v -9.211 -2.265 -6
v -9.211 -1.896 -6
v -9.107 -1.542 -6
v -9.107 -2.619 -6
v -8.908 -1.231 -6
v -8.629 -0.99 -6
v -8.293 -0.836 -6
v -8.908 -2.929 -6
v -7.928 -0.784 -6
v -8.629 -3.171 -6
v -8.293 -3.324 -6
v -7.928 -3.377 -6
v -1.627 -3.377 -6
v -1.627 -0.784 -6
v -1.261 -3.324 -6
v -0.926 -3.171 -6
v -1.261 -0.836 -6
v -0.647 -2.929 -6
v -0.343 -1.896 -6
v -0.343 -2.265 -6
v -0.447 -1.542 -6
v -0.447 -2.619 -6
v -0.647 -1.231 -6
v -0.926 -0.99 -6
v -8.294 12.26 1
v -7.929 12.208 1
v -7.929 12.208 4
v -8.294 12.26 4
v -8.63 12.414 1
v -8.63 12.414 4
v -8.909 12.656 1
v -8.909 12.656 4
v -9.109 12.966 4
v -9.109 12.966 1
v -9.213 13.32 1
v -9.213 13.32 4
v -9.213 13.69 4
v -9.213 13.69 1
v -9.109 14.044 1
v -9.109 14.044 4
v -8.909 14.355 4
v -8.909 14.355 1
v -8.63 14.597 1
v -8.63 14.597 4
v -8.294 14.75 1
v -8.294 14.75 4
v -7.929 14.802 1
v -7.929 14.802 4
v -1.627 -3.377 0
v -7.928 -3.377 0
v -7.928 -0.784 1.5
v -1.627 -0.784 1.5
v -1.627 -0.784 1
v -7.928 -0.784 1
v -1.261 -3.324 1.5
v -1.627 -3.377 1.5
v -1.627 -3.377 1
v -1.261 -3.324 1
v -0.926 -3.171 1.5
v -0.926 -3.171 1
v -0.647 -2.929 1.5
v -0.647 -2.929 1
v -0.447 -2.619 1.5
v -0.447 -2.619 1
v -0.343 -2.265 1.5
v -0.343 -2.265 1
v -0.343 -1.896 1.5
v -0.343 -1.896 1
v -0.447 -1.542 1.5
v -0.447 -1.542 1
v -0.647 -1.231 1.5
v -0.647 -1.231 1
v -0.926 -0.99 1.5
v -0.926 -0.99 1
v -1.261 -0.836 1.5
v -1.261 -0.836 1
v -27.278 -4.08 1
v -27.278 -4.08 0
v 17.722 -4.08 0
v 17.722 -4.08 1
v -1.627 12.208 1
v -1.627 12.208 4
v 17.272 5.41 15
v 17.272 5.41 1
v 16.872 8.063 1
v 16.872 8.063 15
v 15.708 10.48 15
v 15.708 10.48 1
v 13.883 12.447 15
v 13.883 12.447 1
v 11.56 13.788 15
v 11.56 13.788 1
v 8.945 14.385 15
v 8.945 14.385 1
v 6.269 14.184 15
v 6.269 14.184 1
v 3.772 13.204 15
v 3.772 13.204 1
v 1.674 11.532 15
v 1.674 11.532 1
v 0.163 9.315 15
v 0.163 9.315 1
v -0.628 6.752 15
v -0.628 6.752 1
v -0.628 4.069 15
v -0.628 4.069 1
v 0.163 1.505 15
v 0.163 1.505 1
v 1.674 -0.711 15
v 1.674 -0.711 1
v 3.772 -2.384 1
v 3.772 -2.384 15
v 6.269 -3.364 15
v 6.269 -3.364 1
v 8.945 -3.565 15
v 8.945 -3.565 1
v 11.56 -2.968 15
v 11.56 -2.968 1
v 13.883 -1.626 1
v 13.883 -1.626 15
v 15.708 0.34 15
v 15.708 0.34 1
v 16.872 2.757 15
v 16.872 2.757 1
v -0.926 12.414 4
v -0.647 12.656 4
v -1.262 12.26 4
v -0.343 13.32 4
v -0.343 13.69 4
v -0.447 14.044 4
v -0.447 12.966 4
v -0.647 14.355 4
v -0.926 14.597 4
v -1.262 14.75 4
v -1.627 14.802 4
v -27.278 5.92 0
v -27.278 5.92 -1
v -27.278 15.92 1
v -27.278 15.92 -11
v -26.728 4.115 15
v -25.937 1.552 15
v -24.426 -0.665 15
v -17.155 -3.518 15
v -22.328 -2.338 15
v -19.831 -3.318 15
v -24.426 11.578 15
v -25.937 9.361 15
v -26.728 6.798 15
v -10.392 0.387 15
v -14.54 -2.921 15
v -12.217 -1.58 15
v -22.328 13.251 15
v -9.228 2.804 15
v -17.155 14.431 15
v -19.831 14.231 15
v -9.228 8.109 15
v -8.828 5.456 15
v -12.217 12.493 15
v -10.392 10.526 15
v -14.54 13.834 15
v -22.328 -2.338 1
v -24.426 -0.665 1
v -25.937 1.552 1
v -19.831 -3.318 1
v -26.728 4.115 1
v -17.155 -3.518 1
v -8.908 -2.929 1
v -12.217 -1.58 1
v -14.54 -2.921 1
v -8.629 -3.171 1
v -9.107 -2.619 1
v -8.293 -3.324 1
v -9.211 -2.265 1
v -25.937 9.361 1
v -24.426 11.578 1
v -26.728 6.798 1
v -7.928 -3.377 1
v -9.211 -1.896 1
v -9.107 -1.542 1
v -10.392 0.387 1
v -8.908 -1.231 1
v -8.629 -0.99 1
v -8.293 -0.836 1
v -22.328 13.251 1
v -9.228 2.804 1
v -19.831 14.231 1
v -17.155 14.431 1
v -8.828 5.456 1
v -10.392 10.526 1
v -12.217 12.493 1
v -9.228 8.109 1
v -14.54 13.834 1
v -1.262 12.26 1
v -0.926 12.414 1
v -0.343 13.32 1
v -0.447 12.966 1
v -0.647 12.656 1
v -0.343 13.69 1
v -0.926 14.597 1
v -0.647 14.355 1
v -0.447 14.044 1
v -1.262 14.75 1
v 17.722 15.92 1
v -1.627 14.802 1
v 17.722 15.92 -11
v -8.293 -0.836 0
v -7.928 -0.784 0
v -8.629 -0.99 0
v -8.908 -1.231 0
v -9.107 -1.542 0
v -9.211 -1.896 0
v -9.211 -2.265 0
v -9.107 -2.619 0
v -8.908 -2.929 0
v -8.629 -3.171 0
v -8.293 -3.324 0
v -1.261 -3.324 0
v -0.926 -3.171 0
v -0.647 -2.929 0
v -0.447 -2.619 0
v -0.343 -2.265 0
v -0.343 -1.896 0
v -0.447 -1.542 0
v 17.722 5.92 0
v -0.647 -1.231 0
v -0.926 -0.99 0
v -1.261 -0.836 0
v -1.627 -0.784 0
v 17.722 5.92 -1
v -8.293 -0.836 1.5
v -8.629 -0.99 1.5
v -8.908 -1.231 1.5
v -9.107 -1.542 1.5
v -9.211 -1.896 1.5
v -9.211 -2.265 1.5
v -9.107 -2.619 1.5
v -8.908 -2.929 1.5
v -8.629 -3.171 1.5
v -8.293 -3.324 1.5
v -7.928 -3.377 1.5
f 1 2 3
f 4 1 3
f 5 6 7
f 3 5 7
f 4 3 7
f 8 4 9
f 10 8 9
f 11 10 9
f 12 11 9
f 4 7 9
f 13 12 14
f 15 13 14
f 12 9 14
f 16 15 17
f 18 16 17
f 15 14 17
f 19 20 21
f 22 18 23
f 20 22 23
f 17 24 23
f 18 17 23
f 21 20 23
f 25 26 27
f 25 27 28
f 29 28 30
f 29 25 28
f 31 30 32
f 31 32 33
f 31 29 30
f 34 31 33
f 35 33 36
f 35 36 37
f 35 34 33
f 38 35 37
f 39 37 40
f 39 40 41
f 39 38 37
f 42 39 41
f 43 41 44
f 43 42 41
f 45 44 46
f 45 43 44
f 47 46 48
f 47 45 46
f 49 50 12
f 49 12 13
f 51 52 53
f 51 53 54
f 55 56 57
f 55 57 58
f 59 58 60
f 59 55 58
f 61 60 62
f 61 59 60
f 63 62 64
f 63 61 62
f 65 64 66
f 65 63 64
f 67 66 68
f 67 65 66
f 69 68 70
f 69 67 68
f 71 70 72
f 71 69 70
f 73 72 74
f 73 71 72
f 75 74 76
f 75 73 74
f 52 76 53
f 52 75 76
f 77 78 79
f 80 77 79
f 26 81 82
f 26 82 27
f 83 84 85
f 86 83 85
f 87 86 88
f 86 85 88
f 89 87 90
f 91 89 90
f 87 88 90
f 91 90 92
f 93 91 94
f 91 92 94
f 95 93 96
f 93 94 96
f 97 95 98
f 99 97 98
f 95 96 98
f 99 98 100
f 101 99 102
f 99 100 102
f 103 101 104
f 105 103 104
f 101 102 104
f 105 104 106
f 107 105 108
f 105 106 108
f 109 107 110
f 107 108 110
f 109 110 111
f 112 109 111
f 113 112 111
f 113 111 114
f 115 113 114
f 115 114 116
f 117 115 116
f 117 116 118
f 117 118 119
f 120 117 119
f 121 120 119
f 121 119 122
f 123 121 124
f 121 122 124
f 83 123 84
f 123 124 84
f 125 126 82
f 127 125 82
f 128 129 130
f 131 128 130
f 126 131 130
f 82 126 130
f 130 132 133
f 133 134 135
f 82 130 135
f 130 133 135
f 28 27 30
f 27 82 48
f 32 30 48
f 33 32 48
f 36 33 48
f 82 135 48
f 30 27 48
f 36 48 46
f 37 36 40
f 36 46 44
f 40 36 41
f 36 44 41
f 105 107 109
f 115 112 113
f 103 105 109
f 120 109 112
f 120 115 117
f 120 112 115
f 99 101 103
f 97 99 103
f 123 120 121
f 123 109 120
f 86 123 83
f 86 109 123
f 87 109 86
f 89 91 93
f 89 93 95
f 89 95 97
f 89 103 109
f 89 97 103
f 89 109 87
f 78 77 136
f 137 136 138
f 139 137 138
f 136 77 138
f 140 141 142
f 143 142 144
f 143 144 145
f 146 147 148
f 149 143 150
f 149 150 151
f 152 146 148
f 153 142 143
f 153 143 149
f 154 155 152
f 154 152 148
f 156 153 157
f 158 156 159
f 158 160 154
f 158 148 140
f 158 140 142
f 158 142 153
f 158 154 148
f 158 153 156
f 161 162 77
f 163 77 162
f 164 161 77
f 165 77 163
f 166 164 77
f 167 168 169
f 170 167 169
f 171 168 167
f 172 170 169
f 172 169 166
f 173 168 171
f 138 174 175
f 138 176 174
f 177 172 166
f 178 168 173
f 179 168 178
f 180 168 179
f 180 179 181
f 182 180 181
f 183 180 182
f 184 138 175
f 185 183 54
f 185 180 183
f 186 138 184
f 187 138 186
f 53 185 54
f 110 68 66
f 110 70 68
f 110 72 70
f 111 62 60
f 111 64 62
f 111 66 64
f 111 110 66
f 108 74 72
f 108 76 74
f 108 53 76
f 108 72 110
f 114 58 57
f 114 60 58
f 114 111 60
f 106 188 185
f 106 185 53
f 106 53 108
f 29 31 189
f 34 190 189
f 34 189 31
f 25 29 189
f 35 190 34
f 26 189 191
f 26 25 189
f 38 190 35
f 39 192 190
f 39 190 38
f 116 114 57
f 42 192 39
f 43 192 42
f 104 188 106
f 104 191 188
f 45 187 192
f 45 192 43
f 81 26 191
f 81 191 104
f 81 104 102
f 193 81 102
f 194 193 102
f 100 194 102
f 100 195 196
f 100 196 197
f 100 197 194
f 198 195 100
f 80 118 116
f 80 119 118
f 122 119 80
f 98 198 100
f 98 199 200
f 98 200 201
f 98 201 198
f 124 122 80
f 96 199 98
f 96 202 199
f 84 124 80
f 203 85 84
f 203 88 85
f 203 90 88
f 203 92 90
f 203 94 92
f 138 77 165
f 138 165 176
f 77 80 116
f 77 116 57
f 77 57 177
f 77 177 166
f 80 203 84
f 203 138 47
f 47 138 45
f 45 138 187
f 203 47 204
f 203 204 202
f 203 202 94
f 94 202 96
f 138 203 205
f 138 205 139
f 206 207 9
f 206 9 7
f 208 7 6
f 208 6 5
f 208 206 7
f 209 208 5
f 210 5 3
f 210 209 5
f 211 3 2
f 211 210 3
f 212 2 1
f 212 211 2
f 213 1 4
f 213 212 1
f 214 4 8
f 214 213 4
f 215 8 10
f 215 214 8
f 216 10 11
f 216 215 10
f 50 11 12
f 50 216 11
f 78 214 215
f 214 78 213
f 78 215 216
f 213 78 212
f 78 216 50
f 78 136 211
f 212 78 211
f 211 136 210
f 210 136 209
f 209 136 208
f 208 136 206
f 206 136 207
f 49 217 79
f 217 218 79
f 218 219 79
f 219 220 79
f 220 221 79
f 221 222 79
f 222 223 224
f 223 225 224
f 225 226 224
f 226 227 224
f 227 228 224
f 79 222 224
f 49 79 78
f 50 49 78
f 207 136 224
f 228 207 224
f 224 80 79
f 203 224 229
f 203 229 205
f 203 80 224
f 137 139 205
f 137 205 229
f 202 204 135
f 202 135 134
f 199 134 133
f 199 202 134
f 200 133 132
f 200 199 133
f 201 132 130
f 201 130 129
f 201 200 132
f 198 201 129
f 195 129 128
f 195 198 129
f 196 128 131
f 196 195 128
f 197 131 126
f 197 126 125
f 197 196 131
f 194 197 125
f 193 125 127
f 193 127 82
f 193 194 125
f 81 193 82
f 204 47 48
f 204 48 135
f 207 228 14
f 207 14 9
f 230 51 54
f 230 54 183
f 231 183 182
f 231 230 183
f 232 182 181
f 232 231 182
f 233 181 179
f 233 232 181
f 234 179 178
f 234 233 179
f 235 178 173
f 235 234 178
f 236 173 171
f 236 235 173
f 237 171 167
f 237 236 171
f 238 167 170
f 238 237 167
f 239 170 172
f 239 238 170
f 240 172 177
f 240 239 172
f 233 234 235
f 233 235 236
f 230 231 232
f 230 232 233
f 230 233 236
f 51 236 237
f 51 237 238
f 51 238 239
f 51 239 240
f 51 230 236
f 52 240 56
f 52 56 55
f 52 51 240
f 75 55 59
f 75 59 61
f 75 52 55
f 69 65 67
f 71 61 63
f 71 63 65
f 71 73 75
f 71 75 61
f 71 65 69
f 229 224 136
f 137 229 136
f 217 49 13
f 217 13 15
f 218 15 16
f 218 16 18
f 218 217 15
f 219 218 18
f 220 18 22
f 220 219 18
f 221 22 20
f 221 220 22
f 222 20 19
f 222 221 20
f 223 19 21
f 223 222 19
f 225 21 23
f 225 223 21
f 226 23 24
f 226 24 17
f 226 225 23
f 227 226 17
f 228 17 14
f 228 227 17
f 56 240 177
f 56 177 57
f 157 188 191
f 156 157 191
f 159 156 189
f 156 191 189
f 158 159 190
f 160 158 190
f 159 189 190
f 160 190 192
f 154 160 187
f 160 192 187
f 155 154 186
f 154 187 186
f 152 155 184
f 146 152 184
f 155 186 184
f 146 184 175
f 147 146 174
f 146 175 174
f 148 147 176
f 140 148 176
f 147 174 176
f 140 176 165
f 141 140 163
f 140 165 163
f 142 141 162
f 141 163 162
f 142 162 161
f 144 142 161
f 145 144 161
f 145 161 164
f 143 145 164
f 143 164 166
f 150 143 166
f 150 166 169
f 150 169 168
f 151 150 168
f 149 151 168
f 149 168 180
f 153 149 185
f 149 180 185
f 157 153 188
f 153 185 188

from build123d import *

# Parameters (mm, degrees)
ESQUISSE1_W             = 45
ESQUISSE1_H             = 20
BOSS_EXTRU_1_DEPTH      = 1
ESQUISSE2_R             = 9
BOSS_EXTRU_3_DEPTH      = 14
BOSS_EXTRU_4_DEPTH      = 3
BOSS_EXTRU_5_DEPTH      = 6
BOSS_EXTRU_5_DEPTH_BACK = 1.5
SKETCH3_W               = 45
SKETCH3_H               = 10
BOSS_EXTRUDE1_DEPTH     = 12
CHAMFER1_SIZE           = 11


with BuildPart() as part:
    # Esquisse1 → Boss.-Extru.1 (new body)
    with BuildSketch(Plane.XY):
        with Locations((-4.778042712, 5.919811321)):
            Rectangle(ESQUISSE1_W, ESQUISSE1_H)
    extrude(amount=BOSS_EXTRU_1_DEPTH)

    # Esquisse2 → Boss.-Extru.3 (add)
    with BuildSketch(Plane.XY.offset(1)):
        with Locations((-17.828042712, 5.456465128)):
            Circle(ESQUISSE2_R)
        with Locations((8.271957288, 5.410130508)):
            Circle(ESQUISSE2_R)
    extrude(amount=BOSS_EXTRU_3_DEPTH)

    # Esquisse3 → Boss.-Extru.4 (add)
    with BuildSketch(Plane.XY.offset(1)):
        with BuildLine():
            Line((-7.928796825, 14.80247516), (-1.627288599, 14.80247516))
            ThreePointArc((-1.627288599, 14.80247516), (-0.329919258, 13.505105819), (-1.627288599, 12.207736479))
            Line((-1.627288599, 12.207736479), (-7.928796825, 12.207736479))
            ThreePointArc((-7.928796825, 12.207736479), (-9.226166166, 13.505105819), (-7.928796825, 14.80247516))
        make_face()
    extrude(amount=BOSS_EXTRU_4_DEPTH)

    # Esquisse4 → Boss.-Extru.5 (add, two sides: drawn at the far end of the back side and taken through both)
    with BuildSketch(Plane(origin=(0.9463019, -1.208788393, 0), x_dir=(-1, 0, 0), z_dir=(0, 0, -1)).offset(-BOSS_EXTRU_5_DEPTH_BACK)):
        with BuildLine():
            Line((2.572836386, 0.424993111), (8.874344612, 0.424993111))
            ThreePointArc((8.874344612, 0.424993111), (10.17073801, -0.871400286), (8.874344612, -2.167793683))
            Line((8.874344612, -2.167793683), (2.572836386, -2.167793683))
            ThreePointArc((2.572836386, -2.167793683), (1.276442989, -0.871400286), (2.572836386, 0.424993111))
        make_face()
    extrude(amount=BOSS_EXTRU_5_DEPTH + BOSS_EXTRU_5_DEPTH_BACK)

    # Sketch3 → Boss-Extrude1 (add)
    with BuildSketch(Plane(origin=(0, 0, 0), x_dir=(-1, 0, 0), z_dir=(0, 0, -1))):
        with Locations((4.778042712, 10.919811321)):
            Rectangle(SKETCH3_W, SKETCH3_H)
    extrude(amount=BOSS_EXTRUDE1_DEPTH)

    # Chamfer1
    # the kernel refuses this chamfer: 11 mm, written as the material it takes off along each edge
    with BuildSketch(Plane(origin=(-55.56655558, 5.919811321, -12), x_dir=(0, 0.9996219169112968, -0.027495876610586417), z_dir=(1, 0, 0))) as chamfer1_piece_1:
        Polygon((CHAMFER1_SIZE * 0.999621916911, CHAMFER1_SIZE * 0.0274958766106), (-CHAMFER1_SIZE * 0.0274958766106, CHAMFER1_SIZE * 0.999621916911), (0, 0), align=None)
    extrude(amount=101.577025735, mode=Mode.SUBTRACT)


solid = part.part
